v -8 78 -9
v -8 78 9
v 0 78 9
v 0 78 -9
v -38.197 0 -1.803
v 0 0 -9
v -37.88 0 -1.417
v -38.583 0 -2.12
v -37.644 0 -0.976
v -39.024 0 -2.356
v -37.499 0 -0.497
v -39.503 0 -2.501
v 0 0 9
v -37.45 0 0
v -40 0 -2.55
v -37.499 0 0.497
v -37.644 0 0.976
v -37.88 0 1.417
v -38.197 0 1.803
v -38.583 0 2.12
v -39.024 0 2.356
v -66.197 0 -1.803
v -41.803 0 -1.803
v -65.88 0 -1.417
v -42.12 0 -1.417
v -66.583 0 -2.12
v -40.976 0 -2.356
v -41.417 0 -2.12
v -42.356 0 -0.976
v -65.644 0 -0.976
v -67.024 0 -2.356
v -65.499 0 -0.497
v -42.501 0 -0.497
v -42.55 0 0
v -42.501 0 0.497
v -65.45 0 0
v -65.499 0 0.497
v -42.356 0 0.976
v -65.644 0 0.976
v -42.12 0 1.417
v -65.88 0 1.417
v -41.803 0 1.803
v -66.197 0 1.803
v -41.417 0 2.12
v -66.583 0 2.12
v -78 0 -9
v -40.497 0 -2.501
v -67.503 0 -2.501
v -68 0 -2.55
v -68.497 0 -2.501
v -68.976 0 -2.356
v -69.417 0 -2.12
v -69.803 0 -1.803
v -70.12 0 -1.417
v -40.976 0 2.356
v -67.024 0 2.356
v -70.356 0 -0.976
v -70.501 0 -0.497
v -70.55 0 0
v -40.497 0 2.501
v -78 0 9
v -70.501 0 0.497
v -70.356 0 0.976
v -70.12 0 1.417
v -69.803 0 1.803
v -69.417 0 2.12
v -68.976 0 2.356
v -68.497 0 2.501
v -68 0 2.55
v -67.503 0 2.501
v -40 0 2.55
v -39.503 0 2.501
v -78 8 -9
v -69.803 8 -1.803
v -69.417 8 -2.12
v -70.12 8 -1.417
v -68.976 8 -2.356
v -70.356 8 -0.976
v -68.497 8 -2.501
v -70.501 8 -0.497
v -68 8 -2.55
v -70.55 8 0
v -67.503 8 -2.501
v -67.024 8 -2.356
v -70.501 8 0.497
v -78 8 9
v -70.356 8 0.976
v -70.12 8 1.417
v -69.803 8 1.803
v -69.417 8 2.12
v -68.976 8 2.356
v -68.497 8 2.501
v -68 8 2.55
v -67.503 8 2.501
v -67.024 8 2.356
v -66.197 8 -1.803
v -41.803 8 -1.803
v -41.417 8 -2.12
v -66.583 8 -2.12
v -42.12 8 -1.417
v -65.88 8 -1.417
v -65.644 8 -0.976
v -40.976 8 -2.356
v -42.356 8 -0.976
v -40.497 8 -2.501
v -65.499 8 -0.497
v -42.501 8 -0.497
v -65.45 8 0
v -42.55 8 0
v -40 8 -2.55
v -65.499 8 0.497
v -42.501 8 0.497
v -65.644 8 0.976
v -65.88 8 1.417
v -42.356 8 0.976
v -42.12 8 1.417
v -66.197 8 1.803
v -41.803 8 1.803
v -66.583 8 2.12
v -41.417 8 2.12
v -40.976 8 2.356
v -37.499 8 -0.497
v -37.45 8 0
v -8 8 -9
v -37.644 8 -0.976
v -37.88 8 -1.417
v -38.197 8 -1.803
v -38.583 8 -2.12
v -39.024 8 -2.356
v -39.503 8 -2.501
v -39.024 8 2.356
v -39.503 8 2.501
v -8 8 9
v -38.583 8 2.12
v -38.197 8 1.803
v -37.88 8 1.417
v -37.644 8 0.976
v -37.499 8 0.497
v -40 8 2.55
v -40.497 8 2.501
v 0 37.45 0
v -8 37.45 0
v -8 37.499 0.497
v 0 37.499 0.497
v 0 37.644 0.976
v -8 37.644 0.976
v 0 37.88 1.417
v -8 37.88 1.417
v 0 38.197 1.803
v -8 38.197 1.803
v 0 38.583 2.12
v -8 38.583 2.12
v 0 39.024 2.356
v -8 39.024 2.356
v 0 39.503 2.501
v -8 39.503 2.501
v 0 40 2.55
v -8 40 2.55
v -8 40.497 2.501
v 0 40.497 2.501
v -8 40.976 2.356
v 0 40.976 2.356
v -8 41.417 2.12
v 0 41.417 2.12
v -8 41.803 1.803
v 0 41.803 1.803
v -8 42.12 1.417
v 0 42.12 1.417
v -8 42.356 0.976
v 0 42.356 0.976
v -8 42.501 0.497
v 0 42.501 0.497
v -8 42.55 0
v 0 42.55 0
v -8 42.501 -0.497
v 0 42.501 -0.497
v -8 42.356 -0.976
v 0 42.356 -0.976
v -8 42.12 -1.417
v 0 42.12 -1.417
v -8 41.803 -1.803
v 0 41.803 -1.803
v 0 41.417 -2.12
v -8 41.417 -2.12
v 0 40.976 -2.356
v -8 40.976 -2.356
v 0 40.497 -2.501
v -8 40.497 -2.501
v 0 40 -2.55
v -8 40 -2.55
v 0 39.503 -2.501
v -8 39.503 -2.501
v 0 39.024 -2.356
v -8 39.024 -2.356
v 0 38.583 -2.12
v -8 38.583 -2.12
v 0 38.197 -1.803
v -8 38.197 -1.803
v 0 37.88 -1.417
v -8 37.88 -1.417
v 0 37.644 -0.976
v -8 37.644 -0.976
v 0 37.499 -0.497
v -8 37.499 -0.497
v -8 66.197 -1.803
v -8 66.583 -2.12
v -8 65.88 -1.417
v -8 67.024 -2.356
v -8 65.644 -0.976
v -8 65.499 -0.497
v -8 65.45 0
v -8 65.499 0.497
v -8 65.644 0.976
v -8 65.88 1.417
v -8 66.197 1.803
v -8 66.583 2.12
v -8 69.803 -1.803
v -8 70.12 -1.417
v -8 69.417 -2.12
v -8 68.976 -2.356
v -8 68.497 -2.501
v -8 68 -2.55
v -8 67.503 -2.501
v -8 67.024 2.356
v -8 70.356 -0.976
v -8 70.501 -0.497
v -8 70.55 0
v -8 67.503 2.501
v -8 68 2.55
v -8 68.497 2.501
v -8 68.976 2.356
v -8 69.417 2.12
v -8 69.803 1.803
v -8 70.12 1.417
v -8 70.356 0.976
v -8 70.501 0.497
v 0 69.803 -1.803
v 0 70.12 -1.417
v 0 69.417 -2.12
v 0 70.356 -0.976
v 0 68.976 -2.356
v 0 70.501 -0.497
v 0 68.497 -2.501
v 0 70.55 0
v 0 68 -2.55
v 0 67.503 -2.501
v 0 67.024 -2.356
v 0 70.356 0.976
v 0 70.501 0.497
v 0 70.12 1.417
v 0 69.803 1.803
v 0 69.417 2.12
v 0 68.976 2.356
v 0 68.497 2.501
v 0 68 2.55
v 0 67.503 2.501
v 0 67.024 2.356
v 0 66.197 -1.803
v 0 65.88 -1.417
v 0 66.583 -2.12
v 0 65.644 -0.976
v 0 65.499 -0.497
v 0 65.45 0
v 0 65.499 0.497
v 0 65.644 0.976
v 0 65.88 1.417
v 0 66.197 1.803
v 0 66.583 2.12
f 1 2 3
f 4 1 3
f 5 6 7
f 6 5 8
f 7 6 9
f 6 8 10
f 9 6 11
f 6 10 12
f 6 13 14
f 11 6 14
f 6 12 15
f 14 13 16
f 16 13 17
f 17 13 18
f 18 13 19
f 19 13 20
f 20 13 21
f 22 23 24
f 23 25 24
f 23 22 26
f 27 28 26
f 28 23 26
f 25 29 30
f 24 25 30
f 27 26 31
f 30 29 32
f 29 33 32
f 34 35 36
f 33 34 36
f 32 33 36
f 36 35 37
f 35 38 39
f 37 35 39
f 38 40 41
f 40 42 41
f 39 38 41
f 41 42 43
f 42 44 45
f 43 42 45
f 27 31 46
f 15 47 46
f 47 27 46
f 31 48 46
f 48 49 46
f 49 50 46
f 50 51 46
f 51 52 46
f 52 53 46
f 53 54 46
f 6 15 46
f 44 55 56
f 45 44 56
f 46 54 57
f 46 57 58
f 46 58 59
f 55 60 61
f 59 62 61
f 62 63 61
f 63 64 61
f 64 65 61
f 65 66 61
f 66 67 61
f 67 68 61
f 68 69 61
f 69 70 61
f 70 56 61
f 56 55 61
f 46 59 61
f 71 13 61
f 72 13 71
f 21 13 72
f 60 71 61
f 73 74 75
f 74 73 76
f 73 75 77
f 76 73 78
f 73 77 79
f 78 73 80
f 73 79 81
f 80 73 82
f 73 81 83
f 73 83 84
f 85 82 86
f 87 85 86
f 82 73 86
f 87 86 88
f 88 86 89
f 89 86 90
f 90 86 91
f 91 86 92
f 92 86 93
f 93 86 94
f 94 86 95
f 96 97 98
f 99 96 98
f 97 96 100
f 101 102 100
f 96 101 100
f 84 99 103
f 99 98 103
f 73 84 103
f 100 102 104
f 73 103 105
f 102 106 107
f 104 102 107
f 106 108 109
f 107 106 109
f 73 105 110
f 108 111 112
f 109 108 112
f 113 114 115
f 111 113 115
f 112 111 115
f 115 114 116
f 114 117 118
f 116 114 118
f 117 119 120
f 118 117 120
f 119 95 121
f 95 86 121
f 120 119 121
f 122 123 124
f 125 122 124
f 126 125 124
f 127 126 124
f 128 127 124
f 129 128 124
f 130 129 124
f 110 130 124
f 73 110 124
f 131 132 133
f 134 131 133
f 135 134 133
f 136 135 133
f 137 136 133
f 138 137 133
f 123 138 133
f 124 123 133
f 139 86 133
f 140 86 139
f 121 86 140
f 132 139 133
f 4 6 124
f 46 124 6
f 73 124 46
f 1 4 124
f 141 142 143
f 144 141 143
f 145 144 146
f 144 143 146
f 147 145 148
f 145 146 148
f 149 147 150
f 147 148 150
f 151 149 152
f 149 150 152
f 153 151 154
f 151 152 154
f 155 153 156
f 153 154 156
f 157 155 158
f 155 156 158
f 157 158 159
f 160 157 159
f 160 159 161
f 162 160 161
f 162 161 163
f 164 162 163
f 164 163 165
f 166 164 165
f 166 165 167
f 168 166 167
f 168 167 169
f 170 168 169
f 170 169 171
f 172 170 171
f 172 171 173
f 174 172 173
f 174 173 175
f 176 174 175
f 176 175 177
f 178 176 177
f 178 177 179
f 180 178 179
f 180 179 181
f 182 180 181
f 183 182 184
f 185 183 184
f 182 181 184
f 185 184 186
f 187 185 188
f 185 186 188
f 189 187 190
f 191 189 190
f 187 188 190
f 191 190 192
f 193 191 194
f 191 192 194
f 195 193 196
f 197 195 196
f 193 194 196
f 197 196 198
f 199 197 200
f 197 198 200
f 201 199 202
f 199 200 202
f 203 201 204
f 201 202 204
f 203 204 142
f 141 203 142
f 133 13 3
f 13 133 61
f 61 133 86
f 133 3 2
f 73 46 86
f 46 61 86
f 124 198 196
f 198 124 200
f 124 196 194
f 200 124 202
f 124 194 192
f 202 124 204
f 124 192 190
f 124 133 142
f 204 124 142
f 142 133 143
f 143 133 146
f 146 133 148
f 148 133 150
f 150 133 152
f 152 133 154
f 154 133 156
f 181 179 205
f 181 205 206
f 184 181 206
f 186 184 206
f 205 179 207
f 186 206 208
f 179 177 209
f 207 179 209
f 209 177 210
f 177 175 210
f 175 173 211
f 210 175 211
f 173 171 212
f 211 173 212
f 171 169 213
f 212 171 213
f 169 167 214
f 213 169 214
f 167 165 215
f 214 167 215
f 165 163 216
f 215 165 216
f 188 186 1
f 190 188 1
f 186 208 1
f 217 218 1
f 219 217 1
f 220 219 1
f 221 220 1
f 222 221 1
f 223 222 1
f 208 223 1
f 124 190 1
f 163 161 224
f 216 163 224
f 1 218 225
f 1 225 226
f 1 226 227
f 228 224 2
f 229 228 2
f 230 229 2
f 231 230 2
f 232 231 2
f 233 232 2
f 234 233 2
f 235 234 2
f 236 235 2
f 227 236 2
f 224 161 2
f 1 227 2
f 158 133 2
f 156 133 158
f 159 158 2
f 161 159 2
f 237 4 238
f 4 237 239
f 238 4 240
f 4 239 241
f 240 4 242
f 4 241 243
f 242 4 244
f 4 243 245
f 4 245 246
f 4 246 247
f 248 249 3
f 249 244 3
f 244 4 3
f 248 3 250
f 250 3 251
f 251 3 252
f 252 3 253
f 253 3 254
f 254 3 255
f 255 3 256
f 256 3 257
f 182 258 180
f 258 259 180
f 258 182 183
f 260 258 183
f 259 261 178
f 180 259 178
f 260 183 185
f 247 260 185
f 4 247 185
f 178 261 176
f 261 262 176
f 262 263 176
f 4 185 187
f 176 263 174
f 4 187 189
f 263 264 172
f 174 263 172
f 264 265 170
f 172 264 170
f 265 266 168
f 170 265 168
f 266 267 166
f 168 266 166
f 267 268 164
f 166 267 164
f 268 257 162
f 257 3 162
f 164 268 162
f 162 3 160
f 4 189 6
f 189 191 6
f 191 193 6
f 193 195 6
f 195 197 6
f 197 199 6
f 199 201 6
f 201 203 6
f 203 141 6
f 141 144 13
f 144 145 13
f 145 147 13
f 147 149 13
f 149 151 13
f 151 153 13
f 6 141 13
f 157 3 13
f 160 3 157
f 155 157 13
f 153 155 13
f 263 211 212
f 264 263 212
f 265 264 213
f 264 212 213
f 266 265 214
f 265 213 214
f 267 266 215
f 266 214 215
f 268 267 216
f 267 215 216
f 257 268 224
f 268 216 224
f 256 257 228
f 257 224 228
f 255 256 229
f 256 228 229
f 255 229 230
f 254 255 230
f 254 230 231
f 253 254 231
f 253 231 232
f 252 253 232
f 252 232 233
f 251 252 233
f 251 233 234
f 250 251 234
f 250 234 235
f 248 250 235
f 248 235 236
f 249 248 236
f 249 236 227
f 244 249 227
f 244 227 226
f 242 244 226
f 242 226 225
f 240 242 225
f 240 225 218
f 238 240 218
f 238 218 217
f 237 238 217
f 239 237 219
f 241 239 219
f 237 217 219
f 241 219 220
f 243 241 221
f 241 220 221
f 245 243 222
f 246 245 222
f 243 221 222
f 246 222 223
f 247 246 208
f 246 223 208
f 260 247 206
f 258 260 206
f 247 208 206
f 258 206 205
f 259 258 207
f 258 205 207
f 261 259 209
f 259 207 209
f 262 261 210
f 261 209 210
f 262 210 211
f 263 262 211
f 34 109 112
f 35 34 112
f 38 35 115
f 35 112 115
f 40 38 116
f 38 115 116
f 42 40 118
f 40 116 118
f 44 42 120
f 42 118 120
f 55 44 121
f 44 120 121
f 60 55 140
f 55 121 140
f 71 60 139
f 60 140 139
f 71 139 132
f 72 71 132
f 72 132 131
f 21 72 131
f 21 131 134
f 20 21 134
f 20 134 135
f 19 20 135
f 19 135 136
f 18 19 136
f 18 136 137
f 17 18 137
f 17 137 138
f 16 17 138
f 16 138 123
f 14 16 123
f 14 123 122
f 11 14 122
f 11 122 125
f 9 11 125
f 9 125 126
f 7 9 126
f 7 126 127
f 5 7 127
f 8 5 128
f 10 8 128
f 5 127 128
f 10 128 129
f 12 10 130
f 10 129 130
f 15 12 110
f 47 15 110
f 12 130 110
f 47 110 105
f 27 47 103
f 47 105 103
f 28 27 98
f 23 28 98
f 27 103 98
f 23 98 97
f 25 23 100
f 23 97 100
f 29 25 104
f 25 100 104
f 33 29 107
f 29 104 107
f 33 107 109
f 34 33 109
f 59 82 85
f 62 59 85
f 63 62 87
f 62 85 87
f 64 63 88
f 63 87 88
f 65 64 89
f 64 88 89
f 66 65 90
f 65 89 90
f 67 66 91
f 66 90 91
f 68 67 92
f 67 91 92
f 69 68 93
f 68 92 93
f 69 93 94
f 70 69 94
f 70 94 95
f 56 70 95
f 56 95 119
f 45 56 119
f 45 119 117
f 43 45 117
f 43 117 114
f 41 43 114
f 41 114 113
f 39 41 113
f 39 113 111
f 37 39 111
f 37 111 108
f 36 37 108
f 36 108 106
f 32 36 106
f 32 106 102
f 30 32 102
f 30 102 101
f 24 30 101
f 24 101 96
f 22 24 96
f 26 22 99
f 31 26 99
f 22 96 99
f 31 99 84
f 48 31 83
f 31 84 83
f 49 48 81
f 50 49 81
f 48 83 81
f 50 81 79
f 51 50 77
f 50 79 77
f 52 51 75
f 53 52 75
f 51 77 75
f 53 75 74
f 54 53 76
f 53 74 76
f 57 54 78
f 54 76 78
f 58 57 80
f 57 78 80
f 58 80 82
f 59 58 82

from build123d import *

# Parameters (mm, degrees)
EXTRUDE_1_DEPTH     = 9
SKETCH_2_R          = 2.55
CUT_EXTRUDE_1_DEPTH = 106.190303736
SKETCH_3_R          = 2.55
CUT_EXTRUDE_2_DEPTH = 106.190303736


with BuildPart() as part:
    # 草图1 → 凸台-拉伸1 (new, symmetric)
    with BuildSketch(Plane.XY):
        Polygon((0, 78), (0, 0), (-78, 0), (-78, 8), (-8, 8), (-8, 78), align=None)
    extrude(amount=EXTRUDE_1_DEPTH, both=True)

    # 草图2 → 切除-拉伸1 (cut, through all)
    with BuildSketch(Plane(origin=(0, 8, 0), x_dir=(1, 0, 0), z_dir=(0, 1, 0))):
        with Locations(Location((-68, 0, 0), (0, 0, 180))):
            Circle(SKETCH_2_R)
        with Locations(Location((-40, 0, 0), (0, 0, 180))):
            Circle(SKETCH_2_R)
    extrude(amount=-CUT_EXTRUDE_1_DEPTH, mode=Mode.SUBTRACT)

    # 草图3 → 切除-拉伸2 (cut, through all)
    with BuildSketch(Plane.ZY.offset(8)):
        with Locations(Location((0, 40, 0), (0, 0, 270))):
            Circle(SKETCH_3_R)
        with Locations(Location((0, 68, 0), (0, 0, 270))):
            Circle(SKETCH_3_R)
    extrude(amount=-CUT_EXTRUDE_2_DEPTH, mode=Mode.SUBTRACT)


solid = part.part
